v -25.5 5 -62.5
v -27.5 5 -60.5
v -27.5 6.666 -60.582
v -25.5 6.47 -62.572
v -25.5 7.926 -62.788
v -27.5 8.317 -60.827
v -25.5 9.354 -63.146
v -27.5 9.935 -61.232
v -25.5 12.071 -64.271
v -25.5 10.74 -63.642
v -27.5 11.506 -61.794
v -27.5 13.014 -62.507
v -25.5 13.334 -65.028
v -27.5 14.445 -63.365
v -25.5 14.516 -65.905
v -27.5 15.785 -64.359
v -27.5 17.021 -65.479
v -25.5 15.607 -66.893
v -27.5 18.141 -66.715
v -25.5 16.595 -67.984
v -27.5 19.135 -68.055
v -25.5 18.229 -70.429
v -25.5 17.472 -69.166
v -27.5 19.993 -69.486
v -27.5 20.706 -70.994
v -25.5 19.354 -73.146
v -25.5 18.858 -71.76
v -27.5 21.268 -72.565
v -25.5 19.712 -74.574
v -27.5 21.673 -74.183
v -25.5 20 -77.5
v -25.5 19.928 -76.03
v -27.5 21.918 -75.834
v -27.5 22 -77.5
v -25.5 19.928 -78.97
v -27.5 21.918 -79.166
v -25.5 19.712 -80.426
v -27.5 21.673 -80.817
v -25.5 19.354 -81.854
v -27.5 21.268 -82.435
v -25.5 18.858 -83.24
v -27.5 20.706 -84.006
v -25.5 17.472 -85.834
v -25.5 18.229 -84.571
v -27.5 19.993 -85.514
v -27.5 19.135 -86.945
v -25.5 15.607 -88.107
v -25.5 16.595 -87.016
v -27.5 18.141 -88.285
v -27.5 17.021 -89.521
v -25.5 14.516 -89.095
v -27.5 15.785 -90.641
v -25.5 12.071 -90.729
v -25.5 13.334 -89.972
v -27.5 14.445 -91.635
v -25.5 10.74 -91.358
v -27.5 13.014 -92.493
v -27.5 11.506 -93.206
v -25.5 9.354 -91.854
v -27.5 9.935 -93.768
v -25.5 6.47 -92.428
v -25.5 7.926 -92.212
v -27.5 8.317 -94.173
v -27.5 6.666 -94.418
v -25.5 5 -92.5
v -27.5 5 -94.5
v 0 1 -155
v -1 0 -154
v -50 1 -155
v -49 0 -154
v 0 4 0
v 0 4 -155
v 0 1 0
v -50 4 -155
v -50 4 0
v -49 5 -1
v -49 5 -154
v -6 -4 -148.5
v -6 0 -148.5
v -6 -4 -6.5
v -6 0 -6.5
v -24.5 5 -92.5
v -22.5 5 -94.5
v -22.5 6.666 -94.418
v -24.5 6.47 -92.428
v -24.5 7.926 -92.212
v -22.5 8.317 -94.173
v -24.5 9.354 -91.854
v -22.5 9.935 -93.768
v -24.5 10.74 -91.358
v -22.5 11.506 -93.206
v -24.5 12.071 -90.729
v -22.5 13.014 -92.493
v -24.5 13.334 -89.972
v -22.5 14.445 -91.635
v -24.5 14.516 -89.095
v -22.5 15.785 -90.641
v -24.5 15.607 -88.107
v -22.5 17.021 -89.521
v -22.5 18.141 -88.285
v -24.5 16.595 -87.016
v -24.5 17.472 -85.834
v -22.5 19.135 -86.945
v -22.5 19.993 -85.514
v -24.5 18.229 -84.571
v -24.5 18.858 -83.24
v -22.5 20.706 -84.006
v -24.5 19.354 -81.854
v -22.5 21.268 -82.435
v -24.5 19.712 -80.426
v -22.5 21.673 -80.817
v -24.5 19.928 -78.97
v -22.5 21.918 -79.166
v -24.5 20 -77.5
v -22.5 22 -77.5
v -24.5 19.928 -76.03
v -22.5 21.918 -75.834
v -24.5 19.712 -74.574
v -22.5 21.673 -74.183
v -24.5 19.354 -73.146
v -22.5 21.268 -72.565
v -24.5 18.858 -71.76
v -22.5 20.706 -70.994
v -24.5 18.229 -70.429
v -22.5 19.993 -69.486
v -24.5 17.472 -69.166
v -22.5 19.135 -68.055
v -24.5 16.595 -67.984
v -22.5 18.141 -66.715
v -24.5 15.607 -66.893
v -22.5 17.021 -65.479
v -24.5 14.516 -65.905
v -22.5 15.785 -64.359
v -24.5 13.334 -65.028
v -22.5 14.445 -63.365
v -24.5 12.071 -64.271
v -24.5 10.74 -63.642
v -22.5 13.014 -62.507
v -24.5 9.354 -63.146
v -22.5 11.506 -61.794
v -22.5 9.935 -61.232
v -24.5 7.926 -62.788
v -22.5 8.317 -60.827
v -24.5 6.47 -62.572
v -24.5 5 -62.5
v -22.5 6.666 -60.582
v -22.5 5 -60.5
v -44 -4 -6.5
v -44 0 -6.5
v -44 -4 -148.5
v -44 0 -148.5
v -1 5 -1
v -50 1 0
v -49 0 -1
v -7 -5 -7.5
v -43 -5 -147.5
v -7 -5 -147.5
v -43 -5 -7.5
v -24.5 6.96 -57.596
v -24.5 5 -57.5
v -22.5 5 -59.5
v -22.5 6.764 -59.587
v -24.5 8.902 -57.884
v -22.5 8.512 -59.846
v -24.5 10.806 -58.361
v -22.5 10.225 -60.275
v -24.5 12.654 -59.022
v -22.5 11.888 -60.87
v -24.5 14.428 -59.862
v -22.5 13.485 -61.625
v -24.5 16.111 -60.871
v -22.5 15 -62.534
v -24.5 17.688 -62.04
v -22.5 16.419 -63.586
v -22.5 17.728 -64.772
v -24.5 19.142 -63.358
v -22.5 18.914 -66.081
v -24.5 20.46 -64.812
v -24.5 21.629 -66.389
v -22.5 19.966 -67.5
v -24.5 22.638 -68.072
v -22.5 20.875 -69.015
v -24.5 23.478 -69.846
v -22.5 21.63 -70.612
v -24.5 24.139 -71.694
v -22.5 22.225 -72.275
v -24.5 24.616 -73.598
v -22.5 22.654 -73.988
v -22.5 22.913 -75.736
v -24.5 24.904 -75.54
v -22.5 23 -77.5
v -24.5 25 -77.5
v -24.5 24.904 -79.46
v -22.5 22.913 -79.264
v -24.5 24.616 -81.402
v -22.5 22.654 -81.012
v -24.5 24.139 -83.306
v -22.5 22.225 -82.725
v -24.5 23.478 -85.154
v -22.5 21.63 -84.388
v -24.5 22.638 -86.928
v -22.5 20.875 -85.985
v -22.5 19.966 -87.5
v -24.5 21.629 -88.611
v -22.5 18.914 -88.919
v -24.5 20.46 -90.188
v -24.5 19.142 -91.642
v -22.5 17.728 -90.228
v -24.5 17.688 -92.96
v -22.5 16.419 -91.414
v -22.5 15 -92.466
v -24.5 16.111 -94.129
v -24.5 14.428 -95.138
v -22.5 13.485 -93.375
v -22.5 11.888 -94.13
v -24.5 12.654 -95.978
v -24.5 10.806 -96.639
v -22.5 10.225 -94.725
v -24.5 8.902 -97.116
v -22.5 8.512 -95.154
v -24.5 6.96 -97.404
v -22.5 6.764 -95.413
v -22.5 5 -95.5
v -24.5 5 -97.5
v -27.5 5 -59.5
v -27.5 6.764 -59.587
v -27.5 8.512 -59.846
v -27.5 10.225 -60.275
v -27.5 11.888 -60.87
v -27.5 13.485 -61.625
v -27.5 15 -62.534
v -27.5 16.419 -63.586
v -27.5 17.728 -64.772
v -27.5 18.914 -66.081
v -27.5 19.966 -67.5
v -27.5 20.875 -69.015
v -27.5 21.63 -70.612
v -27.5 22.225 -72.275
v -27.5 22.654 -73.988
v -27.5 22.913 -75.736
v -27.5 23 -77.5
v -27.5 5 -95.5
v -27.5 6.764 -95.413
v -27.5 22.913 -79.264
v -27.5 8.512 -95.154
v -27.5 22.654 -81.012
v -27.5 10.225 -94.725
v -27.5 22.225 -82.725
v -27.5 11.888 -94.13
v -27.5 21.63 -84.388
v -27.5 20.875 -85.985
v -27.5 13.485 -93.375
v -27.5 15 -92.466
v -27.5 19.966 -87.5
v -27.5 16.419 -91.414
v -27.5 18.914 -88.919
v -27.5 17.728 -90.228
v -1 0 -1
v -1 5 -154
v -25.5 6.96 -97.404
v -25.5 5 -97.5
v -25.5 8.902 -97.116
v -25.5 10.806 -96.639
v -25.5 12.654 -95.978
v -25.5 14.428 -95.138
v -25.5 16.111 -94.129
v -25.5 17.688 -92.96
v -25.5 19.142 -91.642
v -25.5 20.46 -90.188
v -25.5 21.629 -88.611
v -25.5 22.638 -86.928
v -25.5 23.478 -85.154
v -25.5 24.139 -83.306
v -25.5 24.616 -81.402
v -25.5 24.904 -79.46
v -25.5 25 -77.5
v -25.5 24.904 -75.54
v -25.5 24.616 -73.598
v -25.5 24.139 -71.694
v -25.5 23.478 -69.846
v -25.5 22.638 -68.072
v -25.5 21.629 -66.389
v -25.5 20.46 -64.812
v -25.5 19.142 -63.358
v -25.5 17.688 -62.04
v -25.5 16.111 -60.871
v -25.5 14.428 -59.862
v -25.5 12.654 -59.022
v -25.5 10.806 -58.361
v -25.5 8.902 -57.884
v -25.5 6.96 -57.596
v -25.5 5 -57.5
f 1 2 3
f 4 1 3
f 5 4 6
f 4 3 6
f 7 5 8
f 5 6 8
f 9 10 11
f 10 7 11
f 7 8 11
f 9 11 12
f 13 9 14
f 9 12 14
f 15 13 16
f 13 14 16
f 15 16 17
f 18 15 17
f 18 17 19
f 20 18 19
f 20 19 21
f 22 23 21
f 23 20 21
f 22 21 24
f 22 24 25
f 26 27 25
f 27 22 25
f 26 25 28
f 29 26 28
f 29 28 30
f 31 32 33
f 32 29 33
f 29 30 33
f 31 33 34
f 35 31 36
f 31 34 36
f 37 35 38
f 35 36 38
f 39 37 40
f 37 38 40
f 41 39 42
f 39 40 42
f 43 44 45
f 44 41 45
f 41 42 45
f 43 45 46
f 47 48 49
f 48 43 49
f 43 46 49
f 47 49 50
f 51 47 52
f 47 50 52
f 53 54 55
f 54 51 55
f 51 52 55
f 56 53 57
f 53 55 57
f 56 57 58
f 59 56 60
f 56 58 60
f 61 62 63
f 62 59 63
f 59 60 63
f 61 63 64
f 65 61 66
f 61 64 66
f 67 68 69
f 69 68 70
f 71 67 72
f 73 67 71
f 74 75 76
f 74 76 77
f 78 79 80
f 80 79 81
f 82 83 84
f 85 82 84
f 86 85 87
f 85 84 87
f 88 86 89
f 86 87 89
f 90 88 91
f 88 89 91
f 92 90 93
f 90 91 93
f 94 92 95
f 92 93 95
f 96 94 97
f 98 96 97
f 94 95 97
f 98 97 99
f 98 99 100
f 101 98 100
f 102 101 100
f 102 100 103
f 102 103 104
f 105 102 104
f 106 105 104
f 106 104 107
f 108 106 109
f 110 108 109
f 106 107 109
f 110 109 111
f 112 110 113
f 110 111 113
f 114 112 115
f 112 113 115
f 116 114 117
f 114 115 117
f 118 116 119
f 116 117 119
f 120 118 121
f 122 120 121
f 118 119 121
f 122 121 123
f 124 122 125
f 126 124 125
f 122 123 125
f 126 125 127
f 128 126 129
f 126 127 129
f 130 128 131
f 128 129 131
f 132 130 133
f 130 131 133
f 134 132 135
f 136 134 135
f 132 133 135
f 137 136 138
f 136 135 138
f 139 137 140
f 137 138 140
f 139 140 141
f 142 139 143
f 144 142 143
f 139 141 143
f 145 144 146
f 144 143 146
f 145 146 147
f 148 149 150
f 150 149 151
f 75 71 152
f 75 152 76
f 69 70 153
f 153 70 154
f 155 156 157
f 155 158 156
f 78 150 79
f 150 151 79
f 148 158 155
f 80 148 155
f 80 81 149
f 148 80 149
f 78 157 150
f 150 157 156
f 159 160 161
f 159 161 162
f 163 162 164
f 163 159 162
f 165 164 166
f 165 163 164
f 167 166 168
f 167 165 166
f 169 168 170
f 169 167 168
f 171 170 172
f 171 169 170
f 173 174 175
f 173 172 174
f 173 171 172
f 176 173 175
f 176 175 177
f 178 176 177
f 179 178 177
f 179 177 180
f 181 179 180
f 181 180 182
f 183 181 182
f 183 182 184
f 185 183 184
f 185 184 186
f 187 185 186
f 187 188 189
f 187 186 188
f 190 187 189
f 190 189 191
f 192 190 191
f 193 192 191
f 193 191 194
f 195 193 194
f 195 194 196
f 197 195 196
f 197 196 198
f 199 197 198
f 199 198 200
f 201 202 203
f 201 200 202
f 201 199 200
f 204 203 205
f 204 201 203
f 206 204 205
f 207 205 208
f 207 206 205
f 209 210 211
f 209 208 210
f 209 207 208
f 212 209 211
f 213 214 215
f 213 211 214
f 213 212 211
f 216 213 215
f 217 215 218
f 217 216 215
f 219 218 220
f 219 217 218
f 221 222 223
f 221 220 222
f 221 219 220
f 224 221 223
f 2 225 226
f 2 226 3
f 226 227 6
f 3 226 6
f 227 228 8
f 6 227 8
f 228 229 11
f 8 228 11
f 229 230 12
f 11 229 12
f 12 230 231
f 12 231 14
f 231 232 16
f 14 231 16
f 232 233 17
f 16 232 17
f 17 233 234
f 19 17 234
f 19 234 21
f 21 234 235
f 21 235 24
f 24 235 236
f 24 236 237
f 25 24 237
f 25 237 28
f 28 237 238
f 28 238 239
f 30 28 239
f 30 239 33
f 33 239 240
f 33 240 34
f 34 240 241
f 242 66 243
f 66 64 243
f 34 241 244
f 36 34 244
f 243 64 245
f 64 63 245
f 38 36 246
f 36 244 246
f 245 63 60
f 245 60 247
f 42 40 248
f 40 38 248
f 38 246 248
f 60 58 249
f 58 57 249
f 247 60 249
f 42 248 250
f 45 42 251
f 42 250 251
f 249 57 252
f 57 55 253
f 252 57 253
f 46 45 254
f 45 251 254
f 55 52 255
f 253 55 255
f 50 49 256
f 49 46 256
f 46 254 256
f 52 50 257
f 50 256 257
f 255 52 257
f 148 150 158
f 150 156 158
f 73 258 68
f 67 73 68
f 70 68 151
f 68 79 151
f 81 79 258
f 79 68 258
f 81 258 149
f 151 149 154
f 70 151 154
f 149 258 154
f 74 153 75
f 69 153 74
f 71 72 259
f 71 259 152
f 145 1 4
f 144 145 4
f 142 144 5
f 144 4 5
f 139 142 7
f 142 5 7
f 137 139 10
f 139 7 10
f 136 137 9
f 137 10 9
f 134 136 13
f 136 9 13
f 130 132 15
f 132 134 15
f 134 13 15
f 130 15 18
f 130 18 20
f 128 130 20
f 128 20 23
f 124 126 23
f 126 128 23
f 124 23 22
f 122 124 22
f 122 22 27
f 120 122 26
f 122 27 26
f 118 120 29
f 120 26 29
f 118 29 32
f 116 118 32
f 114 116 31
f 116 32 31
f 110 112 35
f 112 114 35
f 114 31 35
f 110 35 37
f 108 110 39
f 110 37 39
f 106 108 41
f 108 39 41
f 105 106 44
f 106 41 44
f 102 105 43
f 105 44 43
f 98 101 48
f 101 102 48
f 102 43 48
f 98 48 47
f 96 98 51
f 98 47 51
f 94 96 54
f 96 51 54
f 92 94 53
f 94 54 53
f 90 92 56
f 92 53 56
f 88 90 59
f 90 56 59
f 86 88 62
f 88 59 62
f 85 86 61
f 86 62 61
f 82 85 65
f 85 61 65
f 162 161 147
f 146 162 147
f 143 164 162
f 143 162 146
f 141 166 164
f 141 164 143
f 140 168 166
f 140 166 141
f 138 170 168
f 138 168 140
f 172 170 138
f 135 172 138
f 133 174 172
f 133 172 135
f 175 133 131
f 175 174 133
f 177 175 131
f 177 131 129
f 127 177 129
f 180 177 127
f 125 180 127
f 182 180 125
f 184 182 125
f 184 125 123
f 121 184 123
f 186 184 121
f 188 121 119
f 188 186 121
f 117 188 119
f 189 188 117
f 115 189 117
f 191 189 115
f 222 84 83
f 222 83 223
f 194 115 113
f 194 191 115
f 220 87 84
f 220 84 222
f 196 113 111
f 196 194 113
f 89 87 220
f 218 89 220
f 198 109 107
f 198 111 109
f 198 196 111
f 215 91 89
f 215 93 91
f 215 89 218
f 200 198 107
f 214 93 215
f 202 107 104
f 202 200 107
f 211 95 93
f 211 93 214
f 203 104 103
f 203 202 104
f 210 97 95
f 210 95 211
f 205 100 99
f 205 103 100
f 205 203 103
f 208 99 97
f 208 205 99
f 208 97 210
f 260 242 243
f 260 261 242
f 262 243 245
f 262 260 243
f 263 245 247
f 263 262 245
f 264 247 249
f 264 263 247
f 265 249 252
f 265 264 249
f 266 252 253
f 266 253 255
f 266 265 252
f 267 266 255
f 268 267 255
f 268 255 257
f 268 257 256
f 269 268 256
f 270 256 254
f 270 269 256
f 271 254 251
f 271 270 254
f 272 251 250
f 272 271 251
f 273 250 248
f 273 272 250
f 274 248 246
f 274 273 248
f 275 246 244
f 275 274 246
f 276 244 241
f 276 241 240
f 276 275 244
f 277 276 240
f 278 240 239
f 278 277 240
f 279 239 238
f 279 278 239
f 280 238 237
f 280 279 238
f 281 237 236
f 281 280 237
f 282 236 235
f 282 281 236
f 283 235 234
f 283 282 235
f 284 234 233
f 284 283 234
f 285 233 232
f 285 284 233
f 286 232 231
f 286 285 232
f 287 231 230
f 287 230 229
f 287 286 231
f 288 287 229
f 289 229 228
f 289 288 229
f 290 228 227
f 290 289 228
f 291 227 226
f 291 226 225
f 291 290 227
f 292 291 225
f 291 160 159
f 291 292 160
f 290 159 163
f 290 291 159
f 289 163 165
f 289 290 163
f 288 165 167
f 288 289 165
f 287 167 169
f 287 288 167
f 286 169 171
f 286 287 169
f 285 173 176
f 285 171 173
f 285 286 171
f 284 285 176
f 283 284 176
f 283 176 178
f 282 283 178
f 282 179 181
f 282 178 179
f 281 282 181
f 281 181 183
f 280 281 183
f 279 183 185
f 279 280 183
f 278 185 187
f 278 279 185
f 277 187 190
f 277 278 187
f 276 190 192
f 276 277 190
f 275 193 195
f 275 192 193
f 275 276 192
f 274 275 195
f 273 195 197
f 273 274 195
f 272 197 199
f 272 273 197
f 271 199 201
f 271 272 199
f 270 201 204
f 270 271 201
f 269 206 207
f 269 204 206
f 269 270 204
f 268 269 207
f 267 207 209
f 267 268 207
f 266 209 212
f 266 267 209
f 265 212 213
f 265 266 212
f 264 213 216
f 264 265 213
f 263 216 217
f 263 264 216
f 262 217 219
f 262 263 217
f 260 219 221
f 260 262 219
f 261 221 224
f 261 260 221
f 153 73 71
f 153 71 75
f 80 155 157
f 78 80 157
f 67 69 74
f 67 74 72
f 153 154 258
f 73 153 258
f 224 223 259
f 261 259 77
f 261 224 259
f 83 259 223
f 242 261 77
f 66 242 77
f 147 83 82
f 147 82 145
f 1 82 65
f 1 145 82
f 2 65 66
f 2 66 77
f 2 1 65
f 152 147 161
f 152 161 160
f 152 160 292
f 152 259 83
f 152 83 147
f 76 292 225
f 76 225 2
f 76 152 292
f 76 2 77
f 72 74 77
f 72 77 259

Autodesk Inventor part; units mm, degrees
ref_plane "YZ Plane" through (0, 0, 0) normal (1, 0, 0) x (0, 1, 0)
ref_plane "XZ Plane" through (0, 0, 0) normal (0, 1, 0) x (-1, 0, 0)
ref_plane "XY Plane" through (0, 0, 0) normal (0, 0, 1) x (1, 0, 0)
sketch "Sketch1" plane through (0, 0, 0) normal (0, 1, 0) x (-1, 0, 0)
  line L0 (0, 0) -> (50, 0)
  line L1 (50, 0) -> (50, -155)
  line L2 (50, -155) -> (0, -155)
  line L3 (0, -155) -> (0, 0)
  dimension "d0" = 155
  dimension "d1" = 50
extrude "Extrusion1" add sketch "Sketch1" along normal blind 5
sketch "Sketch2" plane through (0, 0, 0) normal (0, -1, 0) x (1, 0, 0)
  line L0 (-6, -6.5) -> (-44, -6.5)
  line L1 (-44, -6.5) -> (-44, -148.5)
  line L2 (-44, -148.5) -> (-6, -148.5)
  line L3 (-6, -148.5) -> (-6, -6.5)
  line L4 (0, 0) -> (0, -155) projected
  line L5 (0, -155) -> (-50, -155) projected
  dimension "d4" = 38
  dimension "d5" = 142
  dimension "d6" = 6
  dimension "d7" = 6.5
extrude "Extrusion2" add sketch "Sketch2" along normal blind 5
ref_plane "Work Plane1" through (-25, 0, 0) normal (1, 0, 0) x (0, 0, -1)
sketch "Sketch3" plane through (-25, 0, 0) normal (1, 0, 0) x (0, 0, -1)
  line L0 (155, 5) -> (0, 5) projected
  arc A0 (97.5, 5) -> (57.5, 5) centre (77.5, 5) ccw
  arc A1 (92.5, 5) -> (62.5, 5) centre (77.5, 5) ccw
  point P0 (0, 0)
  point P1 (73.9182, 2.8954)
  point P2 (77.5, 5)
  point P3 (77.5, 5)
  point P4 (77.5, 25)
  point P5 (77.5, 20)
  dimension "d11" = 77.5
  dimension "d12" = 0
  dimension "d13" = 20
  dimension "d14" = 20
  dimension "d15" = 20
  dimension "d16" = 5
  dimension "d17" = 5
  dimension "d18" = 5
extrude "Extrusion3" add sketch "Sketch3" along normal mid plane 5 contours L0 A1 A0
chamfer "Chamfer1" distance 2 angle 45 4 edges at (-22.5, 25, -77.5) (-27.5, 25, -77.5) (-22.5, 20, -77.5) (-27.5, 20, -77.5)
chamfer "Chamfer2" distance 1 angle 45 8 edges at (0, 5, -77.5) (-25, 5, -155) (-50, 5, -77.5) (-25, 5, 0) (-25, 0, -155) (0, 0, -77.5) (-50, 0, -77.5) (-25, 0, 0)
chamfer "Chamfer3" distance 1 angle 45 4 edges at (-25, -5, -6.5) (-44, -5, -77.5) (-6, -5, -77.5) (-25, -5, -148.5)
equation "\"BendRadius\" = Thickness"
equation "\"BendReliefWidth\" = Thickness"
equation "\"BendReliefDepth\" = 0.5 * Thickness"
equation "\"CornerReliefSize\" = 4 * Thickness"
equation "\"MinimumRemnant\" = 2 * Thickness"
equation "\"TransitionRadius\" = BendRadius"
equation "\"JacobiRadiusSize\" = BendRadius"
equation "\"GapSize\" = Thickness"
equation "\"Thickness\" = 0.5"
properties part number "water lock"
